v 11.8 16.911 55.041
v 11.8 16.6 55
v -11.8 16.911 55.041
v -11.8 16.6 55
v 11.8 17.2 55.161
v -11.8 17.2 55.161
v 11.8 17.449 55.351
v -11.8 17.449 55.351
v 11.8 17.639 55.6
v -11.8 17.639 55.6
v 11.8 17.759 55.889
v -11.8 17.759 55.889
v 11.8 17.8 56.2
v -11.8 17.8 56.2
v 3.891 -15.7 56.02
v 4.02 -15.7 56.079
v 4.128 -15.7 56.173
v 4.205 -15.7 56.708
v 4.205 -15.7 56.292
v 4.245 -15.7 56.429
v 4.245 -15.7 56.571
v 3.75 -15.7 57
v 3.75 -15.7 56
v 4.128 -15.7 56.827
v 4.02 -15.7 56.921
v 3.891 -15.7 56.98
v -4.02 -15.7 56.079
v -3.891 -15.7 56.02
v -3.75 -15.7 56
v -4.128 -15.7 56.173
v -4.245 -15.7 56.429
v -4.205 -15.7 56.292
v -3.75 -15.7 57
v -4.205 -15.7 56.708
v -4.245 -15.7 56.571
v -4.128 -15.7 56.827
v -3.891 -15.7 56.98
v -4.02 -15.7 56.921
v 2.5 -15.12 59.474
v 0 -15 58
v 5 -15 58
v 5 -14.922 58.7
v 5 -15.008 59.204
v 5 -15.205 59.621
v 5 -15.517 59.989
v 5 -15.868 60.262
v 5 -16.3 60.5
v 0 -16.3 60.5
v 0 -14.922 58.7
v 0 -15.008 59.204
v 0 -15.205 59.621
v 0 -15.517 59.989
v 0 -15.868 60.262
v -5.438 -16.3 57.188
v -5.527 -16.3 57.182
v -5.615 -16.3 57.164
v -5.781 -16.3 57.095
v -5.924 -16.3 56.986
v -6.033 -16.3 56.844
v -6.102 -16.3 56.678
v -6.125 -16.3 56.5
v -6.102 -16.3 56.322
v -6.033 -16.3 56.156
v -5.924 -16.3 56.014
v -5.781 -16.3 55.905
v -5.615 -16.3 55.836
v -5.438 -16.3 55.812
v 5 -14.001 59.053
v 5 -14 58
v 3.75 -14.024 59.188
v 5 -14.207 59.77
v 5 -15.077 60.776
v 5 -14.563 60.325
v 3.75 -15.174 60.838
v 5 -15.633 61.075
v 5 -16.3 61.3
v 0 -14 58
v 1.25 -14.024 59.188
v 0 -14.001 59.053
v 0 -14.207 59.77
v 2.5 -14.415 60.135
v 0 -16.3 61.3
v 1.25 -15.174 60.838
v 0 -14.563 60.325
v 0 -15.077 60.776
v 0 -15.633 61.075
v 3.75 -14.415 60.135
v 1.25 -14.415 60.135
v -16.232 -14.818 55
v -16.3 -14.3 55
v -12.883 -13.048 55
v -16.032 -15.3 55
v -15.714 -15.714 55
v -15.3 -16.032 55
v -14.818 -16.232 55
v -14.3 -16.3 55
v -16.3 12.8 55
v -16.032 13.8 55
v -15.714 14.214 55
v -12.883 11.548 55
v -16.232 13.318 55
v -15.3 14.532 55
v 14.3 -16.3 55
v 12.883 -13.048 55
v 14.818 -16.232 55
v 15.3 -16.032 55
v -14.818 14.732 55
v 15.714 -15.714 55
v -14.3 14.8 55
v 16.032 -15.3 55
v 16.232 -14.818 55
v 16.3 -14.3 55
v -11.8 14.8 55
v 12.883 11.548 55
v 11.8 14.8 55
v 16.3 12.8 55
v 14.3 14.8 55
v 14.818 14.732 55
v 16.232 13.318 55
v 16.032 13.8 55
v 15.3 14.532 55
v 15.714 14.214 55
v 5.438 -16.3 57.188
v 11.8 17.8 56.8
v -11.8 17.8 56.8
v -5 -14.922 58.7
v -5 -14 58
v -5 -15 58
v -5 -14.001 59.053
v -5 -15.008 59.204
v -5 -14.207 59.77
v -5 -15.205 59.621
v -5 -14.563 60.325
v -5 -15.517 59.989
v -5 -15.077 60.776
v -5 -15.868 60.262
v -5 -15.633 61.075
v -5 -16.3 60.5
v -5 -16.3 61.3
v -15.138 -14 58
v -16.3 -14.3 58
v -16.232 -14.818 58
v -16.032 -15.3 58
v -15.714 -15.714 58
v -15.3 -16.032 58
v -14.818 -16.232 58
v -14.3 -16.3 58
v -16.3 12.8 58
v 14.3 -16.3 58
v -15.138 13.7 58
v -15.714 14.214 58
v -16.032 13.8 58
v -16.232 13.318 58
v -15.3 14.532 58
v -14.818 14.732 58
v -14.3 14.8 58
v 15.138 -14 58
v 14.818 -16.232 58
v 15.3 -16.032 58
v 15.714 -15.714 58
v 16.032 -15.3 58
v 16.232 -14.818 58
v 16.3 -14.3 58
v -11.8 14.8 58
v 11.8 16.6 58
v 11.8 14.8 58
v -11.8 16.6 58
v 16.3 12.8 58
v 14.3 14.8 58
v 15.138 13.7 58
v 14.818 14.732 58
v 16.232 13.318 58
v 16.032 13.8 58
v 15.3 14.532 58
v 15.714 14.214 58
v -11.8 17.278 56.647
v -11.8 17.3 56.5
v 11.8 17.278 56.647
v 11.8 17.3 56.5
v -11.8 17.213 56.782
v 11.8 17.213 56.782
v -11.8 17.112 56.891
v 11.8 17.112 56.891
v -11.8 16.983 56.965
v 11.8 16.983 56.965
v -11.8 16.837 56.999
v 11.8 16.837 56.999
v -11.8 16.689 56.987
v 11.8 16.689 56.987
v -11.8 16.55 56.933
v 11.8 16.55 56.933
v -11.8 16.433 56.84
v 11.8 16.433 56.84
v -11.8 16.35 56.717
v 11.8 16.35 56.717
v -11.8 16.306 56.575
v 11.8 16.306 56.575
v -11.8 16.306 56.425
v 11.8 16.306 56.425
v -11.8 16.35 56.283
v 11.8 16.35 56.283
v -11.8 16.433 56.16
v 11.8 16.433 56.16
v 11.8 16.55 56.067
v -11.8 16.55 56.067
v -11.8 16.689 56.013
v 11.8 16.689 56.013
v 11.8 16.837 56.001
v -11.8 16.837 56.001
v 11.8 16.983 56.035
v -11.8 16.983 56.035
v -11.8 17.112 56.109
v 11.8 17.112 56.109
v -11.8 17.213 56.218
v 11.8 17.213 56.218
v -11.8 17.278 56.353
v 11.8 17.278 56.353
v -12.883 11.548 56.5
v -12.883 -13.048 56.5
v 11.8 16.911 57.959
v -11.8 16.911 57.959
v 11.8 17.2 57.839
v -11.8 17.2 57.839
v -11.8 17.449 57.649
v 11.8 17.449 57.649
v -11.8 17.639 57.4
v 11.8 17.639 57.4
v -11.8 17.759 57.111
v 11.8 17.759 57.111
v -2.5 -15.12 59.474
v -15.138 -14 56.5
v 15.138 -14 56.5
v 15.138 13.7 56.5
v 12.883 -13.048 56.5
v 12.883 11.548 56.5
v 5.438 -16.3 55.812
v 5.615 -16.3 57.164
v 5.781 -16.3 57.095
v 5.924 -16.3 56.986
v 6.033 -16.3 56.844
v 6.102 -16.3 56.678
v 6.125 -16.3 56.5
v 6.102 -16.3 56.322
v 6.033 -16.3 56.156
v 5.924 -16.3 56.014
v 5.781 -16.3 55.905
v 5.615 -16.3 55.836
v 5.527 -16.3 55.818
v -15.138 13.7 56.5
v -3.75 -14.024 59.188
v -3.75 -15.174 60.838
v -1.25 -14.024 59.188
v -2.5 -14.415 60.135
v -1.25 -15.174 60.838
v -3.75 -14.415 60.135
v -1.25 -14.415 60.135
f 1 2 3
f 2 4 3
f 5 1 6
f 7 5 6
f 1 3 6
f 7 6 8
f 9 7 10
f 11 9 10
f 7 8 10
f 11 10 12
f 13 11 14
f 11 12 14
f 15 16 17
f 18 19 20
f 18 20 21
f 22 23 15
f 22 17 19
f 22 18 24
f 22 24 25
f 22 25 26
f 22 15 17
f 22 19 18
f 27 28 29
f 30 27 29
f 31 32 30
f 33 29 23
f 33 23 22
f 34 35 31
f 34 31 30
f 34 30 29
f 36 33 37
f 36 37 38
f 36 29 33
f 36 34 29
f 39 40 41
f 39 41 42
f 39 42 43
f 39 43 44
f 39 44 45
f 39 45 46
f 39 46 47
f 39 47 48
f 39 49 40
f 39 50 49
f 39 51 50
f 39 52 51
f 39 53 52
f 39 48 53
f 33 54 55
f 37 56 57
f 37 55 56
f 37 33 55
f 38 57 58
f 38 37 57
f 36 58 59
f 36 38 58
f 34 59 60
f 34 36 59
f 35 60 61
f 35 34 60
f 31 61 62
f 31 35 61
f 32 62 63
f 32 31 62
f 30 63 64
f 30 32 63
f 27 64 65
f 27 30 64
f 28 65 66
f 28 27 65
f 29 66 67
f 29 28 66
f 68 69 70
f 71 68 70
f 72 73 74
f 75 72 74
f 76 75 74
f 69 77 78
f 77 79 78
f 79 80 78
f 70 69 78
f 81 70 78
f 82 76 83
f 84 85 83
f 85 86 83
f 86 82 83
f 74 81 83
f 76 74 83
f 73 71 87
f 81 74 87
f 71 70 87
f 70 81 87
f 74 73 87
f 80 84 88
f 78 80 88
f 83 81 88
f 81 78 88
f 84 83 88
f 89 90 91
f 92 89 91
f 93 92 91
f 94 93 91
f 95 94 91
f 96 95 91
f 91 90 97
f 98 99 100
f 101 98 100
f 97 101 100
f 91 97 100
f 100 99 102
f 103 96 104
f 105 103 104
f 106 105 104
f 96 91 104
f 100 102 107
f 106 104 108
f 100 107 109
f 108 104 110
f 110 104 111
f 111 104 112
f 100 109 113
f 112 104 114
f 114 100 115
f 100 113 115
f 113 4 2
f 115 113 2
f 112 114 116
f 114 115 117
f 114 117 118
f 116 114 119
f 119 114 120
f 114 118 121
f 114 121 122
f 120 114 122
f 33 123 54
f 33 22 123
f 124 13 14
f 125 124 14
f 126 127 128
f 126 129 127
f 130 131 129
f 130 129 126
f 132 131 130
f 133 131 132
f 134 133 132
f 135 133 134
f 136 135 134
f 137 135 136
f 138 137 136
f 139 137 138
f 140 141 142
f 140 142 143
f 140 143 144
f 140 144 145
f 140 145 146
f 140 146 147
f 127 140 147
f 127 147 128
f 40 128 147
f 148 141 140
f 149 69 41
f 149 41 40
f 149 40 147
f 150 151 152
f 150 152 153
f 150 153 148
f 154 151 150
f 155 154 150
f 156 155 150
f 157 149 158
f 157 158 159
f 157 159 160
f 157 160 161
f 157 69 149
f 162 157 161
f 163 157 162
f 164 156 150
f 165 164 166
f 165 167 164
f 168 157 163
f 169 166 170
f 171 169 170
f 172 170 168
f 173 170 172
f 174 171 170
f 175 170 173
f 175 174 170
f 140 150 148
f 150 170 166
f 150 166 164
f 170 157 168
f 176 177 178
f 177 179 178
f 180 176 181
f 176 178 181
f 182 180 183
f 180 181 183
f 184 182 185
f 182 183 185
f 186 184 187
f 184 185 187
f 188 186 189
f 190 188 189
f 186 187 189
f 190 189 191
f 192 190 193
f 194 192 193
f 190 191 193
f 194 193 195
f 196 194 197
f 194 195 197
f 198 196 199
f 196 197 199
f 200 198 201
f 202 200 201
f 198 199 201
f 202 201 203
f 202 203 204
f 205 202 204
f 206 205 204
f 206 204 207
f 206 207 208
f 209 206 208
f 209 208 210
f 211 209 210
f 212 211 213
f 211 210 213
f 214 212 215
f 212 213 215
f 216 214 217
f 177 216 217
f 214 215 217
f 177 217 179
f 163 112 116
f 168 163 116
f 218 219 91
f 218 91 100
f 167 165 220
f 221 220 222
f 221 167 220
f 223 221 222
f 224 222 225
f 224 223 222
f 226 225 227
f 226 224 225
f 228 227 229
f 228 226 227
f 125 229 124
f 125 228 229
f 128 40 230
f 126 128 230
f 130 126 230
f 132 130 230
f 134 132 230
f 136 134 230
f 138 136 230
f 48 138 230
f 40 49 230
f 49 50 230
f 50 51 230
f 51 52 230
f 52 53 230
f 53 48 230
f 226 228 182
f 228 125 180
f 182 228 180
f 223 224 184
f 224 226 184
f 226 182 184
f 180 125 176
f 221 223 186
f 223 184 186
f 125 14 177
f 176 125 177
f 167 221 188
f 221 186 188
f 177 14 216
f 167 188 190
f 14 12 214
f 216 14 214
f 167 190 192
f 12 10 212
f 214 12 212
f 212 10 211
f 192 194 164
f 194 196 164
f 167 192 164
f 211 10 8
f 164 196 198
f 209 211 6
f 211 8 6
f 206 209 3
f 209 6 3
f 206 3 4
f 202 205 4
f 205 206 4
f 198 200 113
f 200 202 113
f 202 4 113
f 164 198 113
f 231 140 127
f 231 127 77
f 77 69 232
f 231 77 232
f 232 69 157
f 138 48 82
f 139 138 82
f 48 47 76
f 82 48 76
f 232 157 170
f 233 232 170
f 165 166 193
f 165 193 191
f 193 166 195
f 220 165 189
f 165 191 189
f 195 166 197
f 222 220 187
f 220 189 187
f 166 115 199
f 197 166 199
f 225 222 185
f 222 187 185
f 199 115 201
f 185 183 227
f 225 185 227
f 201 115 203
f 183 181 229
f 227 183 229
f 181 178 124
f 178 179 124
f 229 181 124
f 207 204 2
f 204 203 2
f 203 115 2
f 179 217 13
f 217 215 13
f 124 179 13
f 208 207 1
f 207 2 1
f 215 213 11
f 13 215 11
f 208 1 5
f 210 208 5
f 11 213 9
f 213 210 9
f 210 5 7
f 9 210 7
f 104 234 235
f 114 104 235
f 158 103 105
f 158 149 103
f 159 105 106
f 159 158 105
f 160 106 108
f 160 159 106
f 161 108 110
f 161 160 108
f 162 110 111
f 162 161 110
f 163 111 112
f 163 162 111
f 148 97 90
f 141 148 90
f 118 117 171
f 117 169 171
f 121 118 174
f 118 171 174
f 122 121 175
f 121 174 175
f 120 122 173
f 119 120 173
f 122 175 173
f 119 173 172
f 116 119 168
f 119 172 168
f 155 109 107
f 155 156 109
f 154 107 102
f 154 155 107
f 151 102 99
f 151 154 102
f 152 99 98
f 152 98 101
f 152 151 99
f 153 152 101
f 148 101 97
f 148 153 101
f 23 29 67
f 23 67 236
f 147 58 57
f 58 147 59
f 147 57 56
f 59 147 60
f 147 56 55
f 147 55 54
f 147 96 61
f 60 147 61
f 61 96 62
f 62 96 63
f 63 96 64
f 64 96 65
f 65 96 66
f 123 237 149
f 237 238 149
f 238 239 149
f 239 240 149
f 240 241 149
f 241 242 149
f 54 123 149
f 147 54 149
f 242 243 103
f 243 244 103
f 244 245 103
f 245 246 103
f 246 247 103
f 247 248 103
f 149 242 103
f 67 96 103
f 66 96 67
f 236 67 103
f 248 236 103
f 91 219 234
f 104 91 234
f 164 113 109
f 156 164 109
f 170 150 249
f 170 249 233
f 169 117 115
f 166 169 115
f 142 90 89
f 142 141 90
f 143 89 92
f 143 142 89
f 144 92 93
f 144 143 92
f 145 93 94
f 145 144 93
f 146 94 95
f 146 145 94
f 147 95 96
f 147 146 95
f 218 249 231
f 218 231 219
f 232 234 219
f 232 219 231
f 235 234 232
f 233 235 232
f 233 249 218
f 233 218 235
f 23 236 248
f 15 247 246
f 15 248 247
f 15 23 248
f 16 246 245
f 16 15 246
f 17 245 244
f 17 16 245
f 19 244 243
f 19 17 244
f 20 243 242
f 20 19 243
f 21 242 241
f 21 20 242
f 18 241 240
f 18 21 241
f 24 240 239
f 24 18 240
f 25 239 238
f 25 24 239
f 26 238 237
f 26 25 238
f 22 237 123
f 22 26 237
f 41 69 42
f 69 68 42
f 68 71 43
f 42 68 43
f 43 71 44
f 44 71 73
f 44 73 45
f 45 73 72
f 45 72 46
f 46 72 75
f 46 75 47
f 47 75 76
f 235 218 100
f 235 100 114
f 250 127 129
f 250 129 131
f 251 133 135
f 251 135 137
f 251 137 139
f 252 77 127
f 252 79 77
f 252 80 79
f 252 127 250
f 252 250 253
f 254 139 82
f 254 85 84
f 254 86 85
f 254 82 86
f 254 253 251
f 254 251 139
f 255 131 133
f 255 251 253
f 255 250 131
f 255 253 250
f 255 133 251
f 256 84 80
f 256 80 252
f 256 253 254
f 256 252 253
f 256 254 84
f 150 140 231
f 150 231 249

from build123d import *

# Parameters (mm, degrees)
PAD003_DEPTH         = 3
SKETCH012_R          = 0.5
POCKET003_DEPTH      = 16.301
POCKET003_DEPTH_BACK = 16.301
SKETCH013_W          = 30.27619
SKETCH013_H          = 27.7
POCKET004_DEPTH      = 1.5
SKETCH014_W          = 25.766444
SKETCH014_H          = 24.595242
POCKET005_DEPTH      = 3.001
FILLET_R             = 1.2
PAD005_DEPTH         = 5
FILLET002_R          = 2


with BuildPart() as part:
    # Sketch009 → Pad003 (new body)
    with BuildSketch(Plane.XY):
        Polygon((-11.8, 14.8), (-16.3, 14.8), (-16.3, -16.3), (16.3, -16.3), (16.3, 14.8), (11.8, 14.8), (11.8, 17.8), (-11.8, 17.8), align=None)
    extrude(amount=PAD003_DEPTH)

    # Sketch010 (on DatumPlane) → SubtractiveLoft section 0
    with BuildSketch(Plane.XZ.offset(16.5)):
        with BuildLine():
            ThreePointArc((-6, 2.25), (-6.75, 1.5), (-6, 0.75))
            Line((-6, 0.75), (6, 0.75))
            ThreePointArc((6, 0.75), (6.75, 1.5), (6, 2.25))
            Line((-6, 2.25), (6, 2.25))
        make_face()
    # Sketch011 (on DatumPlane) → SubtractiveLoft section 1
    with BuildSketch(Plane.XZ.offset(15.7)):
        with BuildLine():
            ThreePointArc((-3.75, 2), (-4.25, 1.5), (-3.75, 1))
            Line((-3.75, 1), (3.75, 1))
            ThreePointArc((3.75, 1), (4.25, 1.5), (3.75, 2))
            Line((-3.75, 2), (3.75, 2))
        make_face()
    loft(mode=Mode.SUBTRACT)

    # Sketch012 (on DatumPlane) → Pocket003 (cut, two sides)
    with BuildSketch(Plane.YZ) as pocket003_sk:
        with Locations((16.8, 1.5)):
            Circle(SKETCH012_R)
    extrude(amount=-POCKET003_DEPTH, mode=Mode.SUBTRACT)
    extrude(pocket003_sk.sketch, amount=POCKET003_DEPTH_BACK, mode=Mode.SUBTRACT)

    # Sketch013 (on DatumPlane) → Pocket004 (cut)
    with BuildSketch(Plane.XY.offset(3)):
        with Locations((0, -0.15)):
            Rectangle(SKETCH013_W, SKETCH013_H)
    extrude(amount=-POCKET004_DEPTH, mode=Mode.SUBTRACT)

    # Sketch014 (on DatumPlane) → Pocket005 (cut, through all)
    with BuildSketch(Plane.XY.offset(3)):
        with Locations((0, -0.75)):
            Rectangle(SKETCH014_W, SKETCH014_H)
    extrude(amount=-POCKET005_DEPTH, mode=Mode.SUBTRACT)

    # Fillet
    fillet_edges = [part.edges().sort_by_distance(p)[0] for p in [
        (0, 17.8, 3),
        (0, 17.8, 0),
    ]]
    fillet(fillet_edges, radius=FILLET_R)

    # Sketch018 (on DatumPlane) → Pad005 (join, symmetric)
    with BuildSketch(Plane.YZ):
        with BuildLine():
            Line((-14, 3), (-15, 3))
            add(Edge.make_bspline(
                [(-15, 3), (-14.589899, 4.698463), (-16.3, 5.5)],
                knots=[0, 0, 0, 1, 1, 1], degree=2))
            Line((-16.3, 5.5), (-16.3, 6.3))
            add(Edge.make_bspline(
                [(-14, 3), (-13.679767, 5.619108), (-16.3, 6.3)],
                knots=[0, 0, 0, 1, 1, 1], degree=2))
        make_face()
    extrude(amount=PAD005_DEPTH, both=True)

    # Fillet002
    fillet002_edges = [part.edges().sort_by_distance(p)[0] for p in [
        (16.3, -16.3, 1.5),
        (16.3, 14.8, 1.5),
        (-16.3, 14.8, 1.5),
        (-16.3, -16.3, 1.5),
    ]]
    fillet(fillet002_edges, radius=FILLET002_R)


with BuildPart() as part_1:
    # cover placement: moved
    add(part.part.moved(Location((0, 0, 55))))


solid = part_1.part
